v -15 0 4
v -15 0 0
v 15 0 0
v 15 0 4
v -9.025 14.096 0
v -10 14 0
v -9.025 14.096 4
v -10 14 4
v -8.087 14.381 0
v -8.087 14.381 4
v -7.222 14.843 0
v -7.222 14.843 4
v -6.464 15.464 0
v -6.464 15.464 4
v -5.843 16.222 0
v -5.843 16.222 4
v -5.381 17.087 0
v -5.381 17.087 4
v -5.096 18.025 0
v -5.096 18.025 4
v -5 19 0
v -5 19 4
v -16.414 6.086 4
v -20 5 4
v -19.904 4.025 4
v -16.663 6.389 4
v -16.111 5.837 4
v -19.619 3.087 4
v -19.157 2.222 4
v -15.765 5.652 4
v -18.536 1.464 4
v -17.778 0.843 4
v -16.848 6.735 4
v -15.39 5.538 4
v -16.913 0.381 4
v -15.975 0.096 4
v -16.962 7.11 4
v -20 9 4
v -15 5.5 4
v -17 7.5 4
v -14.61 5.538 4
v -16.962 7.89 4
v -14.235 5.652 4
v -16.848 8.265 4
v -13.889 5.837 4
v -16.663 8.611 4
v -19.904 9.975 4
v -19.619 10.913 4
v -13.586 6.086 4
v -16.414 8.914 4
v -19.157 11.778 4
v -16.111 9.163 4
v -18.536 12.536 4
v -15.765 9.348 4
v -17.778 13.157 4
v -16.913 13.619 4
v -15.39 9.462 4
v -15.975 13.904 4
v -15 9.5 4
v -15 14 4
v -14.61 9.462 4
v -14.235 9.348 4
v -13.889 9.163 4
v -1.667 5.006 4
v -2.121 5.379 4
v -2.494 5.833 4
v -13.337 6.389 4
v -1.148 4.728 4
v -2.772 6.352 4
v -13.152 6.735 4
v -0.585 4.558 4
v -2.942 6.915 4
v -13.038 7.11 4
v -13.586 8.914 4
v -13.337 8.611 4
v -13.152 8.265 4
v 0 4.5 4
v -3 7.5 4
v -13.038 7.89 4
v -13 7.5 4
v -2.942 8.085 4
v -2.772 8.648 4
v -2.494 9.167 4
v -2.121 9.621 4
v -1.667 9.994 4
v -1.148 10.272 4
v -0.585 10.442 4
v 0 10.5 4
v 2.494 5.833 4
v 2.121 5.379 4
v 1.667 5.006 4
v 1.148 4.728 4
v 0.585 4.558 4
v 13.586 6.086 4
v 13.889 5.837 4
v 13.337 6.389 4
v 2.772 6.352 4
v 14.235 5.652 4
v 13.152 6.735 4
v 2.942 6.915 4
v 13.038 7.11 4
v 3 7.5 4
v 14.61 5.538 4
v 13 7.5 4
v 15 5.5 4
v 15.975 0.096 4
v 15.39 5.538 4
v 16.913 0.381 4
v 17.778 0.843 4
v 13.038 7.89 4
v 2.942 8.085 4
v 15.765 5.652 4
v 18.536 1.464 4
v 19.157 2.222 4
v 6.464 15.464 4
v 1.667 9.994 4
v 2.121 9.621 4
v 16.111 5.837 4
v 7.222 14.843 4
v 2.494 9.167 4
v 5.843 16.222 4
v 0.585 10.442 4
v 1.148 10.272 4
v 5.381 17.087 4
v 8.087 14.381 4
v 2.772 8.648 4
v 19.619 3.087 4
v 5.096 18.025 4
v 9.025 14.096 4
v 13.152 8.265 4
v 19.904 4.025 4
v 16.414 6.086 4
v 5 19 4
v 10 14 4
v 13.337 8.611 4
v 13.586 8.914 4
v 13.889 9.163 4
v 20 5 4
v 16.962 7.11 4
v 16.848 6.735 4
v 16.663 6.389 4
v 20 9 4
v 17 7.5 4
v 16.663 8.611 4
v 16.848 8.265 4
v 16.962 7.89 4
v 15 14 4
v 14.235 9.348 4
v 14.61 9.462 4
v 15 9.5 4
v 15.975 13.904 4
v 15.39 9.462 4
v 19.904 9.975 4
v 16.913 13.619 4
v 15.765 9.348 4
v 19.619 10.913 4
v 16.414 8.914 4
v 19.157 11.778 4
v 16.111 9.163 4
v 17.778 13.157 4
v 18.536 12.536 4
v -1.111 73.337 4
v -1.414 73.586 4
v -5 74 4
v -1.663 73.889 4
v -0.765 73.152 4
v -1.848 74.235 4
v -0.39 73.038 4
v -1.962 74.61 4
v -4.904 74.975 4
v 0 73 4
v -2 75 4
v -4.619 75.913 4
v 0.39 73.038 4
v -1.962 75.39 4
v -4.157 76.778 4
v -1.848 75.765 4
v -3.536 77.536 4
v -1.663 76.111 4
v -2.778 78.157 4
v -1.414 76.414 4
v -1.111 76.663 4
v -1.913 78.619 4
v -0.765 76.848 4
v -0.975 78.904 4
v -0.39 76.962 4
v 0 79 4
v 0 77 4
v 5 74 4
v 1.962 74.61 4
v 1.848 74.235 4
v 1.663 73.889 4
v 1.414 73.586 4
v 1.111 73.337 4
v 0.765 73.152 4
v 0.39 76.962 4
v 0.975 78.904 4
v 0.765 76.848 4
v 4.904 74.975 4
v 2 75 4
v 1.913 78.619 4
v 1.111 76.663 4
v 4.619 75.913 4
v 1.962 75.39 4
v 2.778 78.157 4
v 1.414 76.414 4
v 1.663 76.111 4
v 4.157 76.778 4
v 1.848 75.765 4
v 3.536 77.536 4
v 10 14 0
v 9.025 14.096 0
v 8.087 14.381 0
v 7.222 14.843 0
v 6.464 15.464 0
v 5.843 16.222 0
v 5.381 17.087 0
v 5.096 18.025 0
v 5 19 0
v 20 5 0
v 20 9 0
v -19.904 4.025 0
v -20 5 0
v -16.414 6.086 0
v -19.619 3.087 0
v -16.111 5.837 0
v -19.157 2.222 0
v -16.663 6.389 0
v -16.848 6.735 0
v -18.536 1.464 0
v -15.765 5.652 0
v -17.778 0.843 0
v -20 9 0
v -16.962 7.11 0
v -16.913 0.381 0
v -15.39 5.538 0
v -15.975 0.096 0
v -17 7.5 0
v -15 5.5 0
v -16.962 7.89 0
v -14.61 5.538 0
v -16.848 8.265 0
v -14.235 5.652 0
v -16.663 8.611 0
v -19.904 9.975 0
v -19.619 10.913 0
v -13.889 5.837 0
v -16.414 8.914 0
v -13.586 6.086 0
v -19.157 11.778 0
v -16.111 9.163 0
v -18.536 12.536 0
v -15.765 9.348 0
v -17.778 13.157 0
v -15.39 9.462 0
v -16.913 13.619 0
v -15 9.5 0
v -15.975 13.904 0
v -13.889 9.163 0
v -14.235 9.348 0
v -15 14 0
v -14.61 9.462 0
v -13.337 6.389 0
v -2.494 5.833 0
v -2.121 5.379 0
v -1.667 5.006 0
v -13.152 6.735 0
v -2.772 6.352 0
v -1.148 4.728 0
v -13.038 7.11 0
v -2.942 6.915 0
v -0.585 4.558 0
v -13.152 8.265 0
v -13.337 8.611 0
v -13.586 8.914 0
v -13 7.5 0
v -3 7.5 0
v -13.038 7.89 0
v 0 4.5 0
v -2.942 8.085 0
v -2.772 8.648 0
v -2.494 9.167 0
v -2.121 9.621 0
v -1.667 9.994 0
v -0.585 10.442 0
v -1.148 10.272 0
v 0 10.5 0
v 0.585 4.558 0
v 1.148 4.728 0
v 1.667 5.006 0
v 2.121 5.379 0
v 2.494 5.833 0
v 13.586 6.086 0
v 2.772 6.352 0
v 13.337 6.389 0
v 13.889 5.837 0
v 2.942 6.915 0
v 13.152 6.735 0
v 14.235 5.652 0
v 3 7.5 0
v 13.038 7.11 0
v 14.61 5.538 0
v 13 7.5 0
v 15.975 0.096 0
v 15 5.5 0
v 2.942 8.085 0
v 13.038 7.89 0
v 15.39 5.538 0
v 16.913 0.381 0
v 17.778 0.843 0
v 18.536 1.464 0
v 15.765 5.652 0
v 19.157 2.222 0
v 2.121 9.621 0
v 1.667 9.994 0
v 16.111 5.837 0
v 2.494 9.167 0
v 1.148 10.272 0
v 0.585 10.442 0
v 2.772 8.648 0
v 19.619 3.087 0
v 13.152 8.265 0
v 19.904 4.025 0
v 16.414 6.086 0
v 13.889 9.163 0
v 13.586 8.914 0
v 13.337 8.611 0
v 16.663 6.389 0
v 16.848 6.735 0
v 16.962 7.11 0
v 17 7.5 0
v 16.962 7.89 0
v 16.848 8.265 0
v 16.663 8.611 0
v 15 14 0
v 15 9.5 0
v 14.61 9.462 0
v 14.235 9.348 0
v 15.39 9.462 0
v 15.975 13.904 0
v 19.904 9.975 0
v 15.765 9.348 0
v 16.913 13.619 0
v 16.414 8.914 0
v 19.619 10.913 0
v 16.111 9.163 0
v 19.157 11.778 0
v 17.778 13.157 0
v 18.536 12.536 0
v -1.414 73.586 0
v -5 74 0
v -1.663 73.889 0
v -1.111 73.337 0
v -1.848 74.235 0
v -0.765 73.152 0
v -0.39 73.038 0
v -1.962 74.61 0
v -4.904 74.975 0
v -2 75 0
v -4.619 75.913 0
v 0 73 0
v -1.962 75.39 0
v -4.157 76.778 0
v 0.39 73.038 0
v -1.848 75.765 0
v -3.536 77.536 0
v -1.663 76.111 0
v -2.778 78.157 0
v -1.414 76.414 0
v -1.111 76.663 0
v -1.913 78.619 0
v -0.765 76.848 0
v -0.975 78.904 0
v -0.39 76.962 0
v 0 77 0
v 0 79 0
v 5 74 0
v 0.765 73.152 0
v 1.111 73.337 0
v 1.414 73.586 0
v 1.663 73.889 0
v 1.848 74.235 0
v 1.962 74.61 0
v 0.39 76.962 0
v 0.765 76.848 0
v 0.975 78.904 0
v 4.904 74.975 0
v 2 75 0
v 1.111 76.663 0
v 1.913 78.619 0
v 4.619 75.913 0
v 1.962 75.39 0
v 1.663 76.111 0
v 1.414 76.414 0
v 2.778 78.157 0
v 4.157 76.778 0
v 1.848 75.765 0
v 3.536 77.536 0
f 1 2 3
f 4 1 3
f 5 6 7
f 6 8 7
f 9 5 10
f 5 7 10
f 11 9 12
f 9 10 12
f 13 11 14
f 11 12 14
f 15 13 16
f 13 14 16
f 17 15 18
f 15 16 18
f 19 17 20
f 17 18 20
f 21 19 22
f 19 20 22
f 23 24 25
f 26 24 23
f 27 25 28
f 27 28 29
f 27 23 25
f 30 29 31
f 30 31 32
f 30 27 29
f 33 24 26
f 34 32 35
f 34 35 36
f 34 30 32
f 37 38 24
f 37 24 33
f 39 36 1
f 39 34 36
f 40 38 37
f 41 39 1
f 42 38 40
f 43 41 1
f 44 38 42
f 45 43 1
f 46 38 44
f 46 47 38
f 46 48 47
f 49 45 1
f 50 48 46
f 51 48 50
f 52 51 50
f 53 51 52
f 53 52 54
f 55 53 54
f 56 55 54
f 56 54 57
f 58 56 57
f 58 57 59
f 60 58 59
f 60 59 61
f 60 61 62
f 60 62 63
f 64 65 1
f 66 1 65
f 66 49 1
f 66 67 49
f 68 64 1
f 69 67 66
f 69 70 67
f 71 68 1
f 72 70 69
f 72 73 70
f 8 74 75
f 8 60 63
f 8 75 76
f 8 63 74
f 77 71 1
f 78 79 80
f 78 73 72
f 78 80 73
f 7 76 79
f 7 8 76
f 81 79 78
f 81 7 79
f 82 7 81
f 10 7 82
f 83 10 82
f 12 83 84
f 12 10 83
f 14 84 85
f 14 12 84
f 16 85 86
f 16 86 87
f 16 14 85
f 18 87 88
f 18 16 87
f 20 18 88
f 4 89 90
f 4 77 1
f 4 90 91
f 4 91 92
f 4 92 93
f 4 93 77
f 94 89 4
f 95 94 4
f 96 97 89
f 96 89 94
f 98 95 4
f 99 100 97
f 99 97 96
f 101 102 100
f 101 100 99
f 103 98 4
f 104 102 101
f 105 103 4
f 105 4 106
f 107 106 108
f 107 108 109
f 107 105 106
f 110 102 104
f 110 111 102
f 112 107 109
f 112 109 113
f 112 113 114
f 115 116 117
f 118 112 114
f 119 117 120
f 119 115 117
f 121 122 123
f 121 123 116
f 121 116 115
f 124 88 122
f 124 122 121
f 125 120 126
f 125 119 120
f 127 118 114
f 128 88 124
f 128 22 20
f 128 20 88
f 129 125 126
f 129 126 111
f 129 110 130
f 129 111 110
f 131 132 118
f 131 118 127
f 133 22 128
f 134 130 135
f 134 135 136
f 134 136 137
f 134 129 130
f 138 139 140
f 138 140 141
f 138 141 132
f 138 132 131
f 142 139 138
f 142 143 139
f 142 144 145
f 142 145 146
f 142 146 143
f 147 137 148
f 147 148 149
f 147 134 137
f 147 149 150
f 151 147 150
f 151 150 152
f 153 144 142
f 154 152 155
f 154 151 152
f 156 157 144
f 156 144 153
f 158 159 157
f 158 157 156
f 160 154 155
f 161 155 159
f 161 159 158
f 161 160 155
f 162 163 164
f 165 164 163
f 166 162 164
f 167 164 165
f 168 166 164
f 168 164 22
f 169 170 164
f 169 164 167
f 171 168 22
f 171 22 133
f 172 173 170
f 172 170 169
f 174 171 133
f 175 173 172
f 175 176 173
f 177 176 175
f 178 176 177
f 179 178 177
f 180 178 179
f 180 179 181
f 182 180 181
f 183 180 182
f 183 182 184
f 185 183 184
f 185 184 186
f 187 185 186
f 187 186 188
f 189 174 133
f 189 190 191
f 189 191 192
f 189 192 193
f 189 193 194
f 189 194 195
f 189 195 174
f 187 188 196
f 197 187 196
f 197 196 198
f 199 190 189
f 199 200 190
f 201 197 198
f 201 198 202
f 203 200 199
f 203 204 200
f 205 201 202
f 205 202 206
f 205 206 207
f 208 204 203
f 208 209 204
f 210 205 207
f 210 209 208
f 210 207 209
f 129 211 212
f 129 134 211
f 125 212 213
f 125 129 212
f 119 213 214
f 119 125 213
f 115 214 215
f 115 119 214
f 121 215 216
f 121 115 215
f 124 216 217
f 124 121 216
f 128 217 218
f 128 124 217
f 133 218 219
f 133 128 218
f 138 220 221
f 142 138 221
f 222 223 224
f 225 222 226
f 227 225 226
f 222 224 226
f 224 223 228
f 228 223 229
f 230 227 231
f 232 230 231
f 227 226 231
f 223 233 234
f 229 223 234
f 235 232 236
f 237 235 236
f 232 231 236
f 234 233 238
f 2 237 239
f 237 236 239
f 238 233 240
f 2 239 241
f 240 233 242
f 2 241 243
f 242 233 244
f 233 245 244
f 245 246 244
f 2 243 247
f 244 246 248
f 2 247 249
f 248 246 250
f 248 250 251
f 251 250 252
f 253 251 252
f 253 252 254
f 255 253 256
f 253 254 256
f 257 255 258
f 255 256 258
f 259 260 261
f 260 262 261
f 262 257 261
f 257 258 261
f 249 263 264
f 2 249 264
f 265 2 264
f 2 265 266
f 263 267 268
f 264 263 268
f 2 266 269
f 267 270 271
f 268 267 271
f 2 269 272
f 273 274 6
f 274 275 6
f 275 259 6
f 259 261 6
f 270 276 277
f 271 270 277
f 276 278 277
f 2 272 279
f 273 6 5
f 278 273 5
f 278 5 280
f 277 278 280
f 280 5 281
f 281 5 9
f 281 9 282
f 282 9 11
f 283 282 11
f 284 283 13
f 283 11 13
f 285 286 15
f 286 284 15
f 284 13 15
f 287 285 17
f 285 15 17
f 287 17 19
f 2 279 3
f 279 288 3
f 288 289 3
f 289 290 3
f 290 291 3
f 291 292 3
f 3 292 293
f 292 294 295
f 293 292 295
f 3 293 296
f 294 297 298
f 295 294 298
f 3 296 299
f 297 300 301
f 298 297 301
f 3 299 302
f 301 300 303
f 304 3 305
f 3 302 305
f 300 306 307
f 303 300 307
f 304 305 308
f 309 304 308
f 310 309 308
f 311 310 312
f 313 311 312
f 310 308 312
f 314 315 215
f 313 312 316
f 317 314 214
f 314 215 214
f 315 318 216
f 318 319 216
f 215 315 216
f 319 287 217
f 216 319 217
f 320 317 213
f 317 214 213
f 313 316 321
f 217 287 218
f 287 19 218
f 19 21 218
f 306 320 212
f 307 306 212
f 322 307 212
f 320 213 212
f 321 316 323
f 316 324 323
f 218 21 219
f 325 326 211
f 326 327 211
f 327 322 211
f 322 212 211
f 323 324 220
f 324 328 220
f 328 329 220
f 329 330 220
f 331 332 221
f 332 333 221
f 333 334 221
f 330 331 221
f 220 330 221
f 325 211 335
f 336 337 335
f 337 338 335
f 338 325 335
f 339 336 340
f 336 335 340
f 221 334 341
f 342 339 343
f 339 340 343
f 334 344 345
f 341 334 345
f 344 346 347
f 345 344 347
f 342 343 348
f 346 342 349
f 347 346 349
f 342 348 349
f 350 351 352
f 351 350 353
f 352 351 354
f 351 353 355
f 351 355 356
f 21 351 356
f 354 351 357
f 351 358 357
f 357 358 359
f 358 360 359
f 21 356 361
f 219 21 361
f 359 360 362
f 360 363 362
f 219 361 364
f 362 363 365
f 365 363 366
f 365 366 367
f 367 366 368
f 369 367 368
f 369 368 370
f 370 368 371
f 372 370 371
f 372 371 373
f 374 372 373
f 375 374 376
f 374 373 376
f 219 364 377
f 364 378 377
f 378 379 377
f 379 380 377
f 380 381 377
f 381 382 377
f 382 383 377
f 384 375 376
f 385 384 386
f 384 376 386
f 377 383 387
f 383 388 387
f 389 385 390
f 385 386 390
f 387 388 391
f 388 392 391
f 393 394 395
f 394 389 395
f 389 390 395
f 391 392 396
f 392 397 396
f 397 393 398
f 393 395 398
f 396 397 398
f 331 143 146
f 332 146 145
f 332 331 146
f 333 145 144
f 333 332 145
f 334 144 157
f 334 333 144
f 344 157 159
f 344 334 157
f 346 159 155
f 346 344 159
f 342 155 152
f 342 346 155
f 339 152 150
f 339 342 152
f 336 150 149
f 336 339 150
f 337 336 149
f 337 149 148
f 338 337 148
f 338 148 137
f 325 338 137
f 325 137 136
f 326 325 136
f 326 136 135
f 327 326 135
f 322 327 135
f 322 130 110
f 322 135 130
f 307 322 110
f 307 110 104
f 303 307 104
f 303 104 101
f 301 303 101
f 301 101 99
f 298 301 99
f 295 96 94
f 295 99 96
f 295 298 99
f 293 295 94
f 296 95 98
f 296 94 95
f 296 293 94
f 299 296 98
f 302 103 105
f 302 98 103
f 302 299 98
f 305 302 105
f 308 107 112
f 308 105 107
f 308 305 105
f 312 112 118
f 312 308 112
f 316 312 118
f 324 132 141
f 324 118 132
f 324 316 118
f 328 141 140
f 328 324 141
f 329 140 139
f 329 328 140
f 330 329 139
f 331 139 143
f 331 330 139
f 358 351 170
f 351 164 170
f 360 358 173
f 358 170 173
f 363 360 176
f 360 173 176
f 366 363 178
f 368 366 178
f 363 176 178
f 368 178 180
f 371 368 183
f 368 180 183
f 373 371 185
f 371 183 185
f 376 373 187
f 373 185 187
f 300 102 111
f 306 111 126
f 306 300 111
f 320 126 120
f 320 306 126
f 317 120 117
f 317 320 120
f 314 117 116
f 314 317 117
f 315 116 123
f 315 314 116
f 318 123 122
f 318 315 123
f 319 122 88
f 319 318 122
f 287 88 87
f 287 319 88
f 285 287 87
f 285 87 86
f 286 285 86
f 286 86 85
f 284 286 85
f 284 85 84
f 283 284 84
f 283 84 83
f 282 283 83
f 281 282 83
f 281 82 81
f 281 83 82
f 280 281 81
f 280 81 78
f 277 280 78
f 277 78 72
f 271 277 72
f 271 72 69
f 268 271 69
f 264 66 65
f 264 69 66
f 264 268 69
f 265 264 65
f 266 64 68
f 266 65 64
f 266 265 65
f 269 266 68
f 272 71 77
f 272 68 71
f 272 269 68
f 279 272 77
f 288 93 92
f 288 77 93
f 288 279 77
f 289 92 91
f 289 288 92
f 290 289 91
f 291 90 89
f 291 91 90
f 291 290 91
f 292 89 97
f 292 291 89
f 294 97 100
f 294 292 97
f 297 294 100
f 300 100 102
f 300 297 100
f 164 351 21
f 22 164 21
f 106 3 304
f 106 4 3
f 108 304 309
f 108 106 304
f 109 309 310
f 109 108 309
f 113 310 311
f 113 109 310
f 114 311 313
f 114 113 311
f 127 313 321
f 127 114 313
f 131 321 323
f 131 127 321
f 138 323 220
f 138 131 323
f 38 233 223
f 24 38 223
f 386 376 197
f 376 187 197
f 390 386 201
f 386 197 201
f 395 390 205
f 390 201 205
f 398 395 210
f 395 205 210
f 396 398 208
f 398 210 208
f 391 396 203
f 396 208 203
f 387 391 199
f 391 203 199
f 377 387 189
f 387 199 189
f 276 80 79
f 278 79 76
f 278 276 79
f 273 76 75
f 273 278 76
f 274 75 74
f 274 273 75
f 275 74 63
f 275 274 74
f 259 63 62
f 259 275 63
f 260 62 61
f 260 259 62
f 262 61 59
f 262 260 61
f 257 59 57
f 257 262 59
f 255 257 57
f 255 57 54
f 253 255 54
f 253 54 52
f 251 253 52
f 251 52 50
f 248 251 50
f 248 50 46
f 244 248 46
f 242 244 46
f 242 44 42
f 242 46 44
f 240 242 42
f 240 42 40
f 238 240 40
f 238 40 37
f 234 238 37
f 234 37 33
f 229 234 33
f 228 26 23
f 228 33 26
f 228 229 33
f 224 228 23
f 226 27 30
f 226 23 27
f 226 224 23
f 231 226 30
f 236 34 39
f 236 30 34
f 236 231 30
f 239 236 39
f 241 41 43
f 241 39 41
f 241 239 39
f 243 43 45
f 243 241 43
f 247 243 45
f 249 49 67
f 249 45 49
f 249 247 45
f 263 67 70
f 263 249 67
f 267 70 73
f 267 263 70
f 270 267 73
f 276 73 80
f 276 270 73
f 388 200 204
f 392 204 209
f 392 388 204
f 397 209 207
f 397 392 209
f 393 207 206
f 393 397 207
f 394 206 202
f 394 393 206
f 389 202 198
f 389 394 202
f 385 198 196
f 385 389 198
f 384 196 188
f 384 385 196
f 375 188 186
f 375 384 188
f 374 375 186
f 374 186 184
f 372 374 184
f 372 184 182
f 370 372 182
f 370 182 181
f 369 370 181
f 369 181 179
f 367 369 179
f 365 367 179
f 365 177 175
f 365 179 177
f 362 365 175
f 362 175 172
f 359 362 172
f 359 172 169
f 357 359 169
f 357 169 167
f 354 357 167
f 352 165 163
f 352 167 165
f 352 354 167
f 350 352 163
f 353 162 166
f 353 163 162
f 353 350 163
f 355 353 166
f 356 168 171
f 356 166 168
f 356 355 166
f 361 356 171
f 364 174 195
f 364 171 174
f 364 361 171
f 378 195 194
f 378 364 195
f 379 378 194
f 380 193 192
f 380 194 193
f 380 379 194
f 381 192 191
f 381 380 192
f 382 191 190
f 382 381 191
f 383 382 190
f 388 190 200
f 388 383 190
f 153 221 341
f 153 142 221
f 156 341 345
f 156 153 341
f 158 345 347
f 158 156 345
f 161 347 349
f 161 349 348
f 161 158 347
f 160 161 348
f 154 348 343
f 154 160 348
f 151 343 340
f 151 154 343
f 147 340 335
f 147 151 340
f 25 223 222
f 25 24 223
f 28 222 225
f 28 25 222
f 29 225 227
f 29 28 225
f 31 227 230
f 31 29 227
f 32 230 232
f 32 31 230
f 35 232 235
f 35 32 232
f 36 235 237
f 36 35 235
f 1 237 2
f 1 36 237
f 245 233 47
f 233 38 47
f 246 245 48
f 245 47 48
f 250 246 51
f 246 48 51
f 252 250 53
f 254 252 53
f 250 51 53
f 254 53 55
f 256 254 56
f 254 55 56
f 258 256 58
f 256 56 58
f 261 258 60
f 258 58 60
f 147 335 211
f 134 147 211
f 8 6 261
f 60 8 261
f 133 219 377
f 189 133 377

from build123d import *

# Parameters (mm, degrees)
F1_DEPTH = 4
F2_R     = 2
F2_R_2   = 3
F3_DEPTH = 25
F4_R     = 4.99999


# Not quite as in the source:
# - a fillet or chamfer is up to 0.001 mm smaller than in the source, because OpenCascade refuses the exact size


with BuildPart() as f1:
    # F0 (on Top) → F1 (new body)
    with BuildSketch(Plane.XY):
        Polygon((-20, 14), (-20, 0), (20, 0), (20, 14), (5, 14), (5, 79), (-5, 79), (-5, 14), align=None)
    extrude(amount=F1_DEPTH)

    # F2 (on Top) → F3 (cut)
    with BuildSketch(Plane.XY):
        with Locations((-15, 7.5)):
            Circle(F2_R)
        with Locations((15, 7.5)):
            Circle(F2_R)
        with Locations((0, 75)):
            Circle(F2_R)
        with Locations((0, 7.5)):
            Circle(F2_R_2)
    extrude(amount=F3_DEPTH, mode=Mode.SUBTRACT)

    # F4 (radius 5 in the source; OpenCascade refuses exactly that, so slightly less here)
    f4_edges = [f1.edges().sort_by_distance(p)[0] for p in [
        (-5, 79, 2),
        (5, 79, 2),
        (20, 0, 2),
        (-20, 0, 2),
        (-20, 14, 2),
        (20, 14, 2),
        (5, 14, 2),
        (-5, 14, 2),
    ]]
    fillet(f4_edges, radius=F4_R)


solid = f1.part
